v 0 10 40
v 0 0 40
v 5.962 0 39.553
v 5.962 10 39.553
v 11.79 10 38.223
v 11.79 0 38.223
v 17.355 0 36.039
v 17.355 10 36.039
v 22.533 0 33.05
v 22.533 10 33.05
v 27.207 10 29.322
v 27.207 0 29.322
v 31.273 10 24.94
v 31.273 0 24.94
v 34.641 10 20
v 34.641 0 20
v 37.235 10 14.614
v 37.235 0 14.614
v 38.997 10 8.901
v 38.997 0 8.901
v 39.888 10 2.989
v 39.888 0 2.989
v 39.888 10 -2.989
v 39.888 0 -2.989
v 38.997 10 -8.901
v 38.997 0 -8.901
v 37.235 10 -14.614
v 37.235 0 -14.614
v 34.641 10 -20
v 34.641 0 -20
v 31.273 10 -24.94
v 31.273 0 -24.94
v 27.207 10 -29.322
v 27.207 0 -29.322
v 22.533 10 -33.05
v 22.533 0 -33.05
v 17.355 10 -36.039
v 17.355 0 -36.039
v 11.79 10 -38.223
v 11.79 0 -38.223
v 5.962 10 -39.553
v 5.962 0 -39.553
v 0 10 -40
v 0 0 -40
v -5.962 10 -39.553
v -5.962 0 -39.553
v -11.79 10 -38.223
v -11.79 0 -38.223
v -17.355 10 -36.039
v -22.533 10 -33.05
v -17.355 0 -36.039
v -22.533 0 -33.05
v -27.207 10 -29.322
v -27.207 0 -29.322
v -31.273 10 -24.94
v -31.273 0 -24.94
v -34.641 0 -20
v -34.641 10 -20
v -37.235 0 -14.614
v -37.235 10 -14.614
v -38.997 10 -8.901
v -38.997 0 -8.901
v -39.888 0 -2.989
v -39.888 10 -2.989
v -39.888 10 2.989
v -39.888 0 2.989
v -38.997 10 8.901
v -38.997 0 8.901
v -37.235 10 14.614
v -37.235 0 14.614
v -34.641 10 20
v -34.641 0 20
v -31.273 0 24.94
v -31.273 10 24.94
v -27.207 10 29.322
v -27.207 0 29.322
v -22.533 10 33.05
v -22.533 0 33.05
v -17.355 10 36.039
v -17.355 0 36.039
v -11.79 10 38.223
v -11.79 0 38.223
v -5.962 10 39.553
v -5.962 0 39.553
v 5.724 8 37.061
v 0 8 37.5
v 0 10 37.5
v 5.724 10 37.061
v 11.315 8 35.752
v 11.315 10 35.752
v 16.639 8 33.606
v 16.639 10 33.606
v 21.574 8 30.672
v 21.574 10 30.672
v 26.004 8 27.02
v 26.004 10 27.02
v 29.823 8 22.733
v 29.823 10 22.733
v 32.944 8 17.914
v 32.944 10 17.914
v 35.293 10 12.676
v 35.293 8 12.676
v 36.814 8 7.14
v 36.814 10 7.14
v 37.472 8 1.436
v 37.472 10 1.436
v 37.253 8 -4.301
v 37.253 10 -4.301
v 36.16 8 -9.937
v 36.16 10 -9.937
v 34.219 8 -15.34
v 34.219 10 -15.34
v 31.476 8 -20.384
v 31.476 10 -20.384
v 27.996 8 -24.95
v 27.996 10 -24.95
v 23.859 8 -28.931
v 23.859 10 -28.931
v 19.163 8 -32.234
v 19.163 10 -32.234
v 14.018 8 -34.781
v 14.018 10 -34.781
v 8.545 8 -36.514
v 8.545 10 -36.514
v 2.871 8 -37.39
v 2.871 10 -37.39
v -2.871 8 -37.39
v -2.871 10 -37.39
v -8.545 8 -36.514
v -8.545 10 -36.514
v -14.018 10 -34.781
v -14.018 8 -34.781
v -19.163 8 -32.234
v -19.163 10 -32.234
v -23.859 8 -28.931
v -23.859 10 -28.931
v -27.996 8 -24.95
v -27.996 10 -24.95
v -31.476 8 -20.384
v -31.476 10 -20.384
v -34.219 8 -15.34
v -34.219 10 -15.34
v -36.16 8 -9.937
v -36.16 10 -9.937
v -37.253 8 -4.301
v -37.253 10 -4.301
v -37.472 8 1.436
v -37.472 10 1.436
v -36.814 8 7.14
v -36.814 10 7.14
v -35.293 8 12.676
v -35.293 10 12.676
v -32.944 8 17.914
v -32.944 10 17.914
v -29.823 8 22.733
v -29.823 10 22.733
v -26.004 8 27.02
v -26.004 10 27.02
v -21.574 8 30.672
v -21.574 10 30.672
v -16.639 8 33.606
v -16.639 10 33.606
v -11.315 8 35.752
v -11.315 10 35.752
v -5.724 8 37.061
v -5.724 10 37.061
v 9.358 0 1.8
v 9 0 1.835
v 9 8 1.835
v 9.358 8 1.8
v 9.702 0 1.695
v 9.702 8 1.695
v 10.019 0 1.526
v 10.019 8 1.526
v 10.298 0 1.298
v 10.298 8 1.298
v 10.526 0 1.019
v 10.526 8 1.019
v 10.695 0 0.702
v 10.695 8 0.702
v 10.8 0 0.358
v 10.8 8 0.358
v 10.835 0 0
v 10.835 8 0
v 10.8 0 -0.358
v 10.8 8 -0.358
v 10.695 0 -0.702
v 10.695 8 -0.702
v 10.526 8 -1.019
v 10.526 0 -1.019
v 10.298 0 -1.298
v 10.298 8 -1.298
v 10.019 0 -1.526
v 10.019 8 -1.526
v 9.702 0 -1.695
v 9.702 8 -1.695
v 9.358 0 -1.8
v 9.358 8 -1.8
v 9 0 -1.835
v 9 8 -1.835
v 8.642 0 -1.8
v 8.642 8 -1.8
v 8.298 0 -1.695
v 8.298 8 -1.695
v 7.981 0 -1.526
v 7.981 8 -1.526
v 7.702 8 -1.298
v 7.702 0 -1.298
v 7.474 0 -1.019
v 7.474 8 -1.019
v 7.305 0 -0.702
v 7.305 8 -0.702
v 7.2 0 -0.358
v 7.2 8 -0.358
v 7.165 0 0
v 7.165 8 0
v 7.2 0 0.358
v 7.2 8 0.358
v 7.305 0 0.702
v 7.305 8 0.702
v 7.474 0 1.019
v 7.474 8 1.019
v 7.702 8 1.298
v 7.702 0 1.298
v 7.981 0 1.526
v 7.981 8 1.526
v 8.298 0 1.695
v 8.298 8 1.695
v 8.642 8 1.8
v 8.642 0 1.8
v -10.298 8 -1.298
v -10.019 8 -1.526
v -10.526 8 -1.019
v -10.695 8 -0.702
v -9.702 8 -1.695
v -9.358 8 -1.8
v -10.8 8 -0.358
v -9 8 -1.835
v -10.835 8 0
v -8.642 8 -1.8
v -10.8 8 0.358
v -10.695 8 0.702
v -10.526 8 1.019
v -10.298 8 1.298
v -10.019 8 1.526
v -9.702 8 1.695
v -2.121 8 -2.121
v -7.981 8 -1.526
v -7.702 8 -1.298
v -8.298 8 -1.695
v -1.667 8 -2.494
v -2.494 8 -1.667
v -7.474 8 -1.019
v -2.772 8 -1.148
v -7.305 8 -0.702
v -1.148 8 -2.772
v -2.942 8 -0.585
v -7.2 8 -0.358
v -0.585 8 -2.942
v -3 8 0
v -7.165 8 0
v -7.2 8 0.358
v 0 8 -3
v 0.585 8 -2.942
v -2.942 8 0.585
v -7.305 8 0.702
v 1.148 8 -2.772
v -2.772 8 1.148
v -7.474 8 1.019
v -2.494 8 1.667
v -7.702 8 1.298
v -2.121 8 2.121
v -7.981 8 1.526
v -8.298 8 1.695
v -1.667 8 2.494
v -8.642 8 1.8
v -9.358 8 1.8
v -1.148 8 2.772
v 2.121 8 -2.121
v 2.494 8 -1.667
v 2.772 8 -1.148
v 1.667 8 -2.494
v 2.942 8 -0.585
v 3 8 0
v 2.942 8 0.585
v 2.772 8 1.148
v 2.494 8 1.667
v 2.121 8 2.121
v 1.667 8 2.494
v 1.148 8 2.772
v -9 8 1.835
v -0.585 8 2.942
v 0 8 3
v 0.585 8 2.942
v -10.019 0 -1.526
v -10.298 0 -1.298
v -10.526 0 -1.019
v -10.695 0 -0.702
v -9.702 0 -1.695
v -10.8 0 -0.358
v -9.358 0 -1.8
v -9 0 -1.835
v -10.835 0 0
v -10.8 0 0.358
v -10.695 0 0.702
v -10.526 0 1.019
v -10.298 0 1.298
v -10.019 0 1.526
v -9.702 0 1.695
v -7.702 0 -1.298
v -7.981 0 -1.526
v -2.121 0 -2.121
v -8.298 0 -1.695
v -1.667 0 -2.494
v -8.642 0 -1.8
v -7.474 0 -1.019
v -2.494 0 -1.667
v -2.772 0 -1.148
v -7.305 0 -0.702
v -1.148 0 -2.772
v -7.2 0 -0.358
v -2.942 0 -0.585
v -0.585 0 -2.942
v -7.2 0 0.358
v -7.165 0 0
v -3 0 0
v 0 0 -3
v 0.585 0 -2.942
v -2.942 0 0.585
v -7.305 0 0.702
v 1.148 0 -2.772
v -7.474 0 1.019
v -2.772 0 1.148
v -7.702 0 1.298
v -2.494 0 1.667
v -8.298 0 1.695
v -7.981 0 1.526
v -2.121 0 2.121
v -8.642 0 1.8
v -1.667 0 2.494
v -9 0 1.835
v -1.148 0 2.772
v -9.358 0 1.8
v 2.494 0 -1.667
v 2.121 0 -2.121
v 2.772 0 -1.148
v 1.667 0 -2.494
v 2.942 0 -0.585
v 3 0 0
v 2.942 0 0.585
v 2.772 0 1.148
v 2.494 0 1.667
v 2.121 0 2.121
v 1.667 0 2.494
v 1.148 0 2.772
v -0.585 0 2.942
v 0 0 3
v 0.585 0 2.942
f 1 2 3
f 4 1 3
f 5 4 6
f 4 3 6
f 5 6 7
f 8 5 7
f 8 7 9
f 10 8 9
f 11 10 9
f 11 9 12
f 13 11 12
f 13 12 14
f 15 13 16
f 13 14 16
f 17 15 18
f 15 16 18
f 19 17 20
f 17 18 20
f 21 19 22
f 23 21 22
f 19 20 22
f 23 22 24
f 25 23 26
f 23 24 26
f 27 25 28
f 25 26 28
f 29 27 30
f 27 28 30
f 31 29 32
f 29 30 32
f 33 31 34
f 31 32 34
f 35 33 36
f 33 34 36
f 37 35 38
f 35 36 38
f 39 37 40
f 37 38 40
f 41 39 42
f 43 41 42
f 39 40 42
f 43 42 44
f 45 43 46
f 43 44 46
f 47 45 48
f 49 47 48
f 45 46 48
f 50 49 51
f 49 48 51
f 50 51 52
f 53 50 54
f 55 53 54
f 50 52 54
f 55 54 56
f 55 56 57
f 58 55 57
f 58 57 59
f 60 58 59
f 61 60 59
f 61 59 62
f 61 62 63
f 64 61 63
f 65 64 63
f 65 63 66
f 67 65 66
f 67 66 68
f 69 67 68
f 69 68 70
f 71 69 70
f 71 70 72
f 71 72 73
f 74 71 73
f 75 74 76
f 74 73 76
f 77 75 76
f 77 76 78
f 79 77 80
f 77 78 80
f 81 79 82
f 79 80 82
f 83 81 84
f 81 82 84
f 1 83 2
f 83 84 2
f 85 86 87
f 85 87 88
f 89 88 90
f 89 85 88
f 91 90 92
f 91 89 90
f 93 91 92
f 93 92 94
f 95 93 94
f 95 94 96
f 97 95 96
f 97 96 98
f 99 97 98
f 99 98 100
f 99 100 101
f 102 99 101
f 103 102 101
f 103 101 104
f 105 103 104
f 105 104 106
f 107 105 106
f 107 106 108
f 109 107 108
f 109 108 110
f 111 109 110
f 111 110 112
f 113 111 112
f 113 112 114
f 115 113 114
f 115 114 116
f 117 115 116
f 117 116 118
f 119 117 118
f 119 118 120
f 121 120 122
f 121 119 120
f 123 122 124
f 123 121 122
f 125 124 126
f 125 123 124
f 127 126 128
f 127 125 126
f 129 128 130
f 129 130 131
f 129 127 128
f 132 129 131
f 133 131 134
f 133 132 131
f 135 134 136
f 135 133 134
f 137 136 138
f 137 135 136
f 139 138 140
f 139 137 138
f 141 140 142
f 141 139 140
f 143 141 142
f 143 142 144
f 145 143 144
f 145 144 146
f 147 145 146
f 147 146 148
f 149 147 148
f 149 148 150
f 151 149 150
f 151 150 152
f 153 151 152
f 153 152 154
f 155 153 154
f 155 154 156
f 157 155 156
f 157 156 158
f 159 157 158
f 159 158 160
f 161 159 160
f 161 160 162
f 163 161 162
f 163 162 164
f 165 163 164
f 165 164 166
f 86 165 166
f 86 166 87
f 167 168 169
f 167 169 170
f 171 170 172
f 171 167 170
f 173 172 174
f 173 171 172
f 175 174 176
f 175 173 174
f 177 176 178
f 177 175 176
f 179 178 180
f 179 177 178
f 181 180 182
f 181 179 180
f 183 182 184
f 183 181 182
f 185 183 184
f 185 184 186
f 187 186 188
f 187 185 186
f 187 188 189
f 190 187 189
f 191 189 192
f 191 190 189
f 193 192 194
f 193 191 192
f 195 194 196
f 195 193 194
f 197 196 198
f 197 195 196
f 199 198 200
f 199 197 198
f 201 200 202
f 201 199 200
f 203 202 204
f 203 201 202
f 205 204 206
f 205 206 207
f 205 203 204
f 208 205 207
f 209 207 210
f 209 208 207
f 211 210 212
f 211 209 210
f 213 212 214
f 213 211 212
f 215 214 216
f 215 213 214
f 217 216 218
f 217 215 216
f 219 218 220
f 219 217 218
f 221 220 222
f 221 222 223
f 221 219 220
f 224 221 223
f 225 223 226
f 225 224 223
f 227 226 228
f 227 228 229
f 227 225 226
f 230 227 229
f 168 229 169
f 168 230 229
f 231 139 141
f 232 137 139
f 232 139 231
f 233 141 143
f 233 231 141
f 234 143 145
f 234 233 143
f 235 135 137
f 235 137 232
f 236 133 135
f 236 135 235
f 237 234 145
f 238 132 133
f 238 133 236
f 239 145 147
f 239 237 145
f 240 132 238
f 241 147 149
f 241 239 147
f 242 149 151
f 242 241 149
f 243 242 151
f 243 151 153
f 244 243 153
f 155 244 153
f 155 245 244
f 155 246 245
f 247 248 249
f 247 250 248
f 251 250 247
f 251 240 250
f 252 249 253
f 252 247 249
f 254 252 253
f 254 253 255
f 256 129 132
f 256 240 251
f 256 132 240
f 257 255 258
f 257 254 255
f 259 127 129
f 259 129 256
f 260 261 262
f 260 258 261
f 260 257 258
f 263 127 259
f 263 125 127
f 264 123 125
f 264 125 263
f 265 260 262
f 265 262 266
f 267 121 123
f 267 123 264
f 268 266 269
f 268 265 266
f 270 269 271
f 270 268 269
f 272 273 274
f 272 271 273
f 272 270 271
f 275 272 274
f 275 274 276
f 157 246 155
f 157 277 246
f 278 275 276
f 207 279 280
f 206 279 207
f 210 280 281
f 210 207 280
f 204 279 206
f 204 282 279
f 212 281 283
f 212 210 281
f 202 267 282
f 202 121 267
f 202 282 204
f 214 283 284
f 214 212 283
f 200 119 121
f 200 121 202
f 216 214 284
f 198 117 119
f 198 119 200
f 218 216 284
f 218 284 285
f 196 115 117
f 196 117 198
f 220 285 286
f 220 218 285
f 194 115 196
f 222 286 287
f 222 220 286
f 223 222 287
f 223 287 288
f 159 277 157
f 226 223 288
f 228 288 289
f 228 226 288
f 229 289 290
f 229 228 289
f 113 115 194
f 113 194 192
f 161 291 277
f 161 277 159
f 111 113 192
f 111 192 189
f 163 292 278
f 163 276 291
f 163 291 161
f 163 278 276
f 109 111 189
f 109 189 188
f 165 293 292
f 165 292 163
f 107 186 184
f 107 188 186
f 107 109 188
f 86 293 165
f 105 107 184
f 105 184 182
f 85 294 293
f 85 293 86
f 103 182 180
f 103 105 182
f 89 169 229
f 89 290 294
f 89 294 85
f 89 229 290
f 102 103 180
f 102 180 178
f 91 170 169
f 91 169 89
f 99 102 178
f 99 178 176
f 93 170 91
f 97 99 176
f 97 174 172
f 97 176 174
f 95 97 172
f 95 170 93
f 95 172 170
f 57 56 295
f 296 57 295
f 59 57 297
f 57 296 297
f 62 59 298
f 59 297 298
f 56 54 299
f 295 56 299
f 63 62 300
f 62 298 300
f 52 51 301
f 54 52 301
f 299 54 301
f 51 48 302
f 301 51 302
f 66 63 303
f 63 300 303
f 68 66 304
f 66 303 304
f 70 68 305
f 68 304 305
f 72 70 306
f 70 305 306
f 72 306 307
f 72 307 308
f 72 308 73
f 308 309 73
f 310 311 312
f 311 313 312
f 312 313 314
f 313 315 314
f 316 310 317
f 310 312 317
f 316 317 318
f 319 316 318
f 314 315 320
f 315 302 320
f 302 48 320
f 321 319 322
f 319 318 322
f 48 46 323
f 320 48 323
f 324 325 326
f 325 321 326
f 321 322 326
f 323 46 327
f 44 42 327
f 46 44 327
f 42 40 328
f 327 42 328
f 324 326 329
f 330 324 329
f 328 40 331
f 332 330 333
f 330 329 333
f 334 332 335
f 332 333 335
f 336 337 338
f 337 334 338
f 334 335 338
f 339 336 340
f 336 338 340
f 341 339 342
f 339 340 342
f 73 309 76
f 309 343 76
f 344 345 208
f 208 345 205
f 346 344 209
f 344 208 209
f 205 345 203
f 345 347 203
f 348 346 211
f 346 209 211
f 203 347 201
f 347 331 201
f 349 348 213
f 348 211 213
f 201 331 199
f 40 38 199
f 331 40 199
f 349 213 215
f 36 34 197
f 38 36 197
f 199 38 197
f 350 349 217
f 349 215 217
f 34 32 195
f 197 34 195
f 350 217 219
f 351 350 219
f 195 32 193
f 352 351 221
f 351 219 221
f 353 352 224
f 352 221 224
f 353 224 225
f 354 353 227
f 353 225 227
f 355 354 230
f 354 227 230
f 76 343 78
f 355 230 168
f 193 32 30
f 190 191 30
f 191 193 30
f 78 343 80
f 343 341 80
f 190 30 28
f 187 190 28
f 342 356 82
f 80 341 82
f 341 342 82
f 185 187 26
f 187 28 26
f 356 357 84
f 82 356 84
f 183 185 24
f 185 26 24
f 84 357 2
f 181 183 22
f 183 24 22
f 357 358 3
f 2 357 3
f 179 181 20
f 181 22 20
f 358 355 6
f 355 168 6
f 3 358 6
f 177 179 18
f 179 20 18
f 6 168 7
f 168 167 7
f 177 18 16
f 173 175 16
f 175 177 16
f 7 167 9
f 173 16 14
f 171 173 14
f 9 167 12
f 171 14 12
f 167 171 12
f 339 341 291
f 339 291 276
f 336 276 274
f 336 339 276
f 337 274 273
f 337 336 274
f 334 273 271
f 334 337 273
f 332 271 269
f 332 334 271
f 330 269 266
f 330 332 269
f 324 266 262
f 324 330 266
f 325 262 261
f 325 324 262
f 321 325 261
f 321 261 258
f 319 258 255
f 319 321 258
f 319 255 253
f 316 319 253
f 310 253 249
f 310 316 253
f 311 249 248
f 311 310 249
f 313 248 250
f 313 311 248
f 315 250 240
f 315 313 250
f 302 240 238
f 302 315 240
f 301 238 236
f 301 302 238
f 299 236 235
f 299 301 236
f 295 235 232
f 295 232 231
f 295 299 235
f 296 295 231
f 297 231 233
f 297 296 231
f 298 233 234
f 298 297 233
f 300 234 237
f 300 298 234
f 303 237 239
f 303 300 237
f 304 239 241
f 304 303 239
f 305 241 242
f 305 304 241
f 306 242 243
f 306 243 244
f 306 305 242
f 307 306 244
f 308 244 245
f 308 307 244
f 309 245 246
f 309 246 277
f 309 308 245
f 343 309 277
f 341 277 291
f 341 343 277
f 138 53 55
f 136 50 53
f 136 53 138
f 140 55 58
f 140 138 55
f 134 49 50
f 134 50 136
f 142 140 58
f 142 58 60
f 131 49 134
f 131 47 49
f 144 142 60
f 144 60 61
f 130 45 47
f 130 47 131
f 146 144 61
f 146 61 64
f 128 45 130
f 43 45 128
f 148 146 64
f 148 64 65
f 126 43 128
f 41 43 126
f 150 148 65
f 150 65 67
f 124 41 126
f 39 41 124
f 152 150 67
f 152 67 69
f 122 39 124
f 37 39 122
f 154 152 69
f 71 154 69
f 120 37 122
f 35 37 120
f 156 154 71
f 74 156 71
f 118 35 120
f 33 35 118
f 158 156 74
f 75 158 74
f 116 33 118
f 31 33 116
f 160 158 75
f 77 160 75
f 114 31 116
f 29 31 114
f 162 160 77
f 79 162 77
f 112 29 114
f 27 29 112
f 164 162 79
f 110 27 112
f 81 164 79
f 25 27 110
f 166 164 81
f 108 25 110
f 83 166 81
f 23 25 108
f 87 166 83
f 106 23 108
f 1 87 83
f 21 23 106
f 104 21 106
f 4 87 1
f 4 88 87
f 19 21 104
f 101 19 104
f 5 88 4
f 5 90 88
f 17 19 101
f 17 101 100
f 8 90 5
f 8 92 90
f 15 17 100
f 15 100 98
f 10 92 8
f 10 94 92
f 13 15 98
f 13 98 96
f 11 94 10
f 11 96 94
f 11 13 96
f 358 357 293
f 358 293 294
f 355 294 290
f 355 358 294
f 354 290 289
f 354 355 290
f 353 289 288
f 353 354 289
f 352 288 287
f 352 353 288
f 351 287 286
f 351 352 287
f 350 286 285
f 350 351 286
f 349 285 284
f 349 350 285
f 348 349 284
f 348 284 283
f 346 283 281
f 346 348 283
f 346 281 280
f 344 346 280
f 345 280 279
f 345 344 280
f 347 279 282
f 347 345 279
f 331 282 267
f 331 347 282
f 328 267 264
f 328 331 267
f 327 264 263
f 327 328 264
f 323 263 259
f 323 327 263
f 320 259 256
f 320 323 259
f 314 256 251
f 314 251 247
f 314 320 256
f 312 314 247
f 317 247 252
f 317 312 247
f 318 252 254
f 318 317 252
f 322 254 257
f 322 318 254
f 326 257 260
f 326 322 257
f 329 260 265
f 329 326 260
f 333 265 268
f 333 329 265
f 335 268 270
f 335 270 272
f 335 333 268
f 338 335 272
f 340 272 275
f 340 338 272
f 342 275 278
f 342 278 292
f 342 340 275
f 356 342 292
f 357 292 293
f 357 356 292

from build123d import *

# Parameters (mm, degrees)
SKETCH2_R           = 40
SKETCH2_R_2         = 37.5
BOSS_EXTRUDE1_DEPTH = 10
SKETCH2_4_R         = 37.5
SKETCH2_4_R_2       = 1.835
SKETCH2_4_R_3       = 3
BOSS_EXTRUDE2_DEPTH = 8


with BuildPart() as part:
    # Sketch2 → Boss-Extrude1 (new body)
    with BuildSketch(Plane(origin=(0, 0, 0), x_dir=(1, 0, 0), z_dir=(0, 1, 0))):
        Circle(SKETCH2_R)
        Circle(SKETCH2_R_2, mode=Mode.SUBTRACT)
    extrude(amount=BOSS_EXTRUDE1_DEPTH)

    # Sketch2<4> → Boss-Extrude2 (add)
    with BuildSketch(Plane(origin=(0, 0, 0), x_dir=(1, 0, 0), z_dir=(0, 1, 0))):
        Circle(SKETCH2_4_R)
        with Locations((-9, 0)):
            Circle(SKETCH2_4_R_2, mode=Mode.SUBTRACT)
        Circle(SKETCH2_4_R_3, mode=Mode.SUBTRACT)
        with Locations((9, 0)):
            Circle(SKETCH2_4_R_2, mode=Mode.SUBTRACT)
    extrude(amount=BOSS_EXTRUDE2_DEPTH)


solid = part.part
